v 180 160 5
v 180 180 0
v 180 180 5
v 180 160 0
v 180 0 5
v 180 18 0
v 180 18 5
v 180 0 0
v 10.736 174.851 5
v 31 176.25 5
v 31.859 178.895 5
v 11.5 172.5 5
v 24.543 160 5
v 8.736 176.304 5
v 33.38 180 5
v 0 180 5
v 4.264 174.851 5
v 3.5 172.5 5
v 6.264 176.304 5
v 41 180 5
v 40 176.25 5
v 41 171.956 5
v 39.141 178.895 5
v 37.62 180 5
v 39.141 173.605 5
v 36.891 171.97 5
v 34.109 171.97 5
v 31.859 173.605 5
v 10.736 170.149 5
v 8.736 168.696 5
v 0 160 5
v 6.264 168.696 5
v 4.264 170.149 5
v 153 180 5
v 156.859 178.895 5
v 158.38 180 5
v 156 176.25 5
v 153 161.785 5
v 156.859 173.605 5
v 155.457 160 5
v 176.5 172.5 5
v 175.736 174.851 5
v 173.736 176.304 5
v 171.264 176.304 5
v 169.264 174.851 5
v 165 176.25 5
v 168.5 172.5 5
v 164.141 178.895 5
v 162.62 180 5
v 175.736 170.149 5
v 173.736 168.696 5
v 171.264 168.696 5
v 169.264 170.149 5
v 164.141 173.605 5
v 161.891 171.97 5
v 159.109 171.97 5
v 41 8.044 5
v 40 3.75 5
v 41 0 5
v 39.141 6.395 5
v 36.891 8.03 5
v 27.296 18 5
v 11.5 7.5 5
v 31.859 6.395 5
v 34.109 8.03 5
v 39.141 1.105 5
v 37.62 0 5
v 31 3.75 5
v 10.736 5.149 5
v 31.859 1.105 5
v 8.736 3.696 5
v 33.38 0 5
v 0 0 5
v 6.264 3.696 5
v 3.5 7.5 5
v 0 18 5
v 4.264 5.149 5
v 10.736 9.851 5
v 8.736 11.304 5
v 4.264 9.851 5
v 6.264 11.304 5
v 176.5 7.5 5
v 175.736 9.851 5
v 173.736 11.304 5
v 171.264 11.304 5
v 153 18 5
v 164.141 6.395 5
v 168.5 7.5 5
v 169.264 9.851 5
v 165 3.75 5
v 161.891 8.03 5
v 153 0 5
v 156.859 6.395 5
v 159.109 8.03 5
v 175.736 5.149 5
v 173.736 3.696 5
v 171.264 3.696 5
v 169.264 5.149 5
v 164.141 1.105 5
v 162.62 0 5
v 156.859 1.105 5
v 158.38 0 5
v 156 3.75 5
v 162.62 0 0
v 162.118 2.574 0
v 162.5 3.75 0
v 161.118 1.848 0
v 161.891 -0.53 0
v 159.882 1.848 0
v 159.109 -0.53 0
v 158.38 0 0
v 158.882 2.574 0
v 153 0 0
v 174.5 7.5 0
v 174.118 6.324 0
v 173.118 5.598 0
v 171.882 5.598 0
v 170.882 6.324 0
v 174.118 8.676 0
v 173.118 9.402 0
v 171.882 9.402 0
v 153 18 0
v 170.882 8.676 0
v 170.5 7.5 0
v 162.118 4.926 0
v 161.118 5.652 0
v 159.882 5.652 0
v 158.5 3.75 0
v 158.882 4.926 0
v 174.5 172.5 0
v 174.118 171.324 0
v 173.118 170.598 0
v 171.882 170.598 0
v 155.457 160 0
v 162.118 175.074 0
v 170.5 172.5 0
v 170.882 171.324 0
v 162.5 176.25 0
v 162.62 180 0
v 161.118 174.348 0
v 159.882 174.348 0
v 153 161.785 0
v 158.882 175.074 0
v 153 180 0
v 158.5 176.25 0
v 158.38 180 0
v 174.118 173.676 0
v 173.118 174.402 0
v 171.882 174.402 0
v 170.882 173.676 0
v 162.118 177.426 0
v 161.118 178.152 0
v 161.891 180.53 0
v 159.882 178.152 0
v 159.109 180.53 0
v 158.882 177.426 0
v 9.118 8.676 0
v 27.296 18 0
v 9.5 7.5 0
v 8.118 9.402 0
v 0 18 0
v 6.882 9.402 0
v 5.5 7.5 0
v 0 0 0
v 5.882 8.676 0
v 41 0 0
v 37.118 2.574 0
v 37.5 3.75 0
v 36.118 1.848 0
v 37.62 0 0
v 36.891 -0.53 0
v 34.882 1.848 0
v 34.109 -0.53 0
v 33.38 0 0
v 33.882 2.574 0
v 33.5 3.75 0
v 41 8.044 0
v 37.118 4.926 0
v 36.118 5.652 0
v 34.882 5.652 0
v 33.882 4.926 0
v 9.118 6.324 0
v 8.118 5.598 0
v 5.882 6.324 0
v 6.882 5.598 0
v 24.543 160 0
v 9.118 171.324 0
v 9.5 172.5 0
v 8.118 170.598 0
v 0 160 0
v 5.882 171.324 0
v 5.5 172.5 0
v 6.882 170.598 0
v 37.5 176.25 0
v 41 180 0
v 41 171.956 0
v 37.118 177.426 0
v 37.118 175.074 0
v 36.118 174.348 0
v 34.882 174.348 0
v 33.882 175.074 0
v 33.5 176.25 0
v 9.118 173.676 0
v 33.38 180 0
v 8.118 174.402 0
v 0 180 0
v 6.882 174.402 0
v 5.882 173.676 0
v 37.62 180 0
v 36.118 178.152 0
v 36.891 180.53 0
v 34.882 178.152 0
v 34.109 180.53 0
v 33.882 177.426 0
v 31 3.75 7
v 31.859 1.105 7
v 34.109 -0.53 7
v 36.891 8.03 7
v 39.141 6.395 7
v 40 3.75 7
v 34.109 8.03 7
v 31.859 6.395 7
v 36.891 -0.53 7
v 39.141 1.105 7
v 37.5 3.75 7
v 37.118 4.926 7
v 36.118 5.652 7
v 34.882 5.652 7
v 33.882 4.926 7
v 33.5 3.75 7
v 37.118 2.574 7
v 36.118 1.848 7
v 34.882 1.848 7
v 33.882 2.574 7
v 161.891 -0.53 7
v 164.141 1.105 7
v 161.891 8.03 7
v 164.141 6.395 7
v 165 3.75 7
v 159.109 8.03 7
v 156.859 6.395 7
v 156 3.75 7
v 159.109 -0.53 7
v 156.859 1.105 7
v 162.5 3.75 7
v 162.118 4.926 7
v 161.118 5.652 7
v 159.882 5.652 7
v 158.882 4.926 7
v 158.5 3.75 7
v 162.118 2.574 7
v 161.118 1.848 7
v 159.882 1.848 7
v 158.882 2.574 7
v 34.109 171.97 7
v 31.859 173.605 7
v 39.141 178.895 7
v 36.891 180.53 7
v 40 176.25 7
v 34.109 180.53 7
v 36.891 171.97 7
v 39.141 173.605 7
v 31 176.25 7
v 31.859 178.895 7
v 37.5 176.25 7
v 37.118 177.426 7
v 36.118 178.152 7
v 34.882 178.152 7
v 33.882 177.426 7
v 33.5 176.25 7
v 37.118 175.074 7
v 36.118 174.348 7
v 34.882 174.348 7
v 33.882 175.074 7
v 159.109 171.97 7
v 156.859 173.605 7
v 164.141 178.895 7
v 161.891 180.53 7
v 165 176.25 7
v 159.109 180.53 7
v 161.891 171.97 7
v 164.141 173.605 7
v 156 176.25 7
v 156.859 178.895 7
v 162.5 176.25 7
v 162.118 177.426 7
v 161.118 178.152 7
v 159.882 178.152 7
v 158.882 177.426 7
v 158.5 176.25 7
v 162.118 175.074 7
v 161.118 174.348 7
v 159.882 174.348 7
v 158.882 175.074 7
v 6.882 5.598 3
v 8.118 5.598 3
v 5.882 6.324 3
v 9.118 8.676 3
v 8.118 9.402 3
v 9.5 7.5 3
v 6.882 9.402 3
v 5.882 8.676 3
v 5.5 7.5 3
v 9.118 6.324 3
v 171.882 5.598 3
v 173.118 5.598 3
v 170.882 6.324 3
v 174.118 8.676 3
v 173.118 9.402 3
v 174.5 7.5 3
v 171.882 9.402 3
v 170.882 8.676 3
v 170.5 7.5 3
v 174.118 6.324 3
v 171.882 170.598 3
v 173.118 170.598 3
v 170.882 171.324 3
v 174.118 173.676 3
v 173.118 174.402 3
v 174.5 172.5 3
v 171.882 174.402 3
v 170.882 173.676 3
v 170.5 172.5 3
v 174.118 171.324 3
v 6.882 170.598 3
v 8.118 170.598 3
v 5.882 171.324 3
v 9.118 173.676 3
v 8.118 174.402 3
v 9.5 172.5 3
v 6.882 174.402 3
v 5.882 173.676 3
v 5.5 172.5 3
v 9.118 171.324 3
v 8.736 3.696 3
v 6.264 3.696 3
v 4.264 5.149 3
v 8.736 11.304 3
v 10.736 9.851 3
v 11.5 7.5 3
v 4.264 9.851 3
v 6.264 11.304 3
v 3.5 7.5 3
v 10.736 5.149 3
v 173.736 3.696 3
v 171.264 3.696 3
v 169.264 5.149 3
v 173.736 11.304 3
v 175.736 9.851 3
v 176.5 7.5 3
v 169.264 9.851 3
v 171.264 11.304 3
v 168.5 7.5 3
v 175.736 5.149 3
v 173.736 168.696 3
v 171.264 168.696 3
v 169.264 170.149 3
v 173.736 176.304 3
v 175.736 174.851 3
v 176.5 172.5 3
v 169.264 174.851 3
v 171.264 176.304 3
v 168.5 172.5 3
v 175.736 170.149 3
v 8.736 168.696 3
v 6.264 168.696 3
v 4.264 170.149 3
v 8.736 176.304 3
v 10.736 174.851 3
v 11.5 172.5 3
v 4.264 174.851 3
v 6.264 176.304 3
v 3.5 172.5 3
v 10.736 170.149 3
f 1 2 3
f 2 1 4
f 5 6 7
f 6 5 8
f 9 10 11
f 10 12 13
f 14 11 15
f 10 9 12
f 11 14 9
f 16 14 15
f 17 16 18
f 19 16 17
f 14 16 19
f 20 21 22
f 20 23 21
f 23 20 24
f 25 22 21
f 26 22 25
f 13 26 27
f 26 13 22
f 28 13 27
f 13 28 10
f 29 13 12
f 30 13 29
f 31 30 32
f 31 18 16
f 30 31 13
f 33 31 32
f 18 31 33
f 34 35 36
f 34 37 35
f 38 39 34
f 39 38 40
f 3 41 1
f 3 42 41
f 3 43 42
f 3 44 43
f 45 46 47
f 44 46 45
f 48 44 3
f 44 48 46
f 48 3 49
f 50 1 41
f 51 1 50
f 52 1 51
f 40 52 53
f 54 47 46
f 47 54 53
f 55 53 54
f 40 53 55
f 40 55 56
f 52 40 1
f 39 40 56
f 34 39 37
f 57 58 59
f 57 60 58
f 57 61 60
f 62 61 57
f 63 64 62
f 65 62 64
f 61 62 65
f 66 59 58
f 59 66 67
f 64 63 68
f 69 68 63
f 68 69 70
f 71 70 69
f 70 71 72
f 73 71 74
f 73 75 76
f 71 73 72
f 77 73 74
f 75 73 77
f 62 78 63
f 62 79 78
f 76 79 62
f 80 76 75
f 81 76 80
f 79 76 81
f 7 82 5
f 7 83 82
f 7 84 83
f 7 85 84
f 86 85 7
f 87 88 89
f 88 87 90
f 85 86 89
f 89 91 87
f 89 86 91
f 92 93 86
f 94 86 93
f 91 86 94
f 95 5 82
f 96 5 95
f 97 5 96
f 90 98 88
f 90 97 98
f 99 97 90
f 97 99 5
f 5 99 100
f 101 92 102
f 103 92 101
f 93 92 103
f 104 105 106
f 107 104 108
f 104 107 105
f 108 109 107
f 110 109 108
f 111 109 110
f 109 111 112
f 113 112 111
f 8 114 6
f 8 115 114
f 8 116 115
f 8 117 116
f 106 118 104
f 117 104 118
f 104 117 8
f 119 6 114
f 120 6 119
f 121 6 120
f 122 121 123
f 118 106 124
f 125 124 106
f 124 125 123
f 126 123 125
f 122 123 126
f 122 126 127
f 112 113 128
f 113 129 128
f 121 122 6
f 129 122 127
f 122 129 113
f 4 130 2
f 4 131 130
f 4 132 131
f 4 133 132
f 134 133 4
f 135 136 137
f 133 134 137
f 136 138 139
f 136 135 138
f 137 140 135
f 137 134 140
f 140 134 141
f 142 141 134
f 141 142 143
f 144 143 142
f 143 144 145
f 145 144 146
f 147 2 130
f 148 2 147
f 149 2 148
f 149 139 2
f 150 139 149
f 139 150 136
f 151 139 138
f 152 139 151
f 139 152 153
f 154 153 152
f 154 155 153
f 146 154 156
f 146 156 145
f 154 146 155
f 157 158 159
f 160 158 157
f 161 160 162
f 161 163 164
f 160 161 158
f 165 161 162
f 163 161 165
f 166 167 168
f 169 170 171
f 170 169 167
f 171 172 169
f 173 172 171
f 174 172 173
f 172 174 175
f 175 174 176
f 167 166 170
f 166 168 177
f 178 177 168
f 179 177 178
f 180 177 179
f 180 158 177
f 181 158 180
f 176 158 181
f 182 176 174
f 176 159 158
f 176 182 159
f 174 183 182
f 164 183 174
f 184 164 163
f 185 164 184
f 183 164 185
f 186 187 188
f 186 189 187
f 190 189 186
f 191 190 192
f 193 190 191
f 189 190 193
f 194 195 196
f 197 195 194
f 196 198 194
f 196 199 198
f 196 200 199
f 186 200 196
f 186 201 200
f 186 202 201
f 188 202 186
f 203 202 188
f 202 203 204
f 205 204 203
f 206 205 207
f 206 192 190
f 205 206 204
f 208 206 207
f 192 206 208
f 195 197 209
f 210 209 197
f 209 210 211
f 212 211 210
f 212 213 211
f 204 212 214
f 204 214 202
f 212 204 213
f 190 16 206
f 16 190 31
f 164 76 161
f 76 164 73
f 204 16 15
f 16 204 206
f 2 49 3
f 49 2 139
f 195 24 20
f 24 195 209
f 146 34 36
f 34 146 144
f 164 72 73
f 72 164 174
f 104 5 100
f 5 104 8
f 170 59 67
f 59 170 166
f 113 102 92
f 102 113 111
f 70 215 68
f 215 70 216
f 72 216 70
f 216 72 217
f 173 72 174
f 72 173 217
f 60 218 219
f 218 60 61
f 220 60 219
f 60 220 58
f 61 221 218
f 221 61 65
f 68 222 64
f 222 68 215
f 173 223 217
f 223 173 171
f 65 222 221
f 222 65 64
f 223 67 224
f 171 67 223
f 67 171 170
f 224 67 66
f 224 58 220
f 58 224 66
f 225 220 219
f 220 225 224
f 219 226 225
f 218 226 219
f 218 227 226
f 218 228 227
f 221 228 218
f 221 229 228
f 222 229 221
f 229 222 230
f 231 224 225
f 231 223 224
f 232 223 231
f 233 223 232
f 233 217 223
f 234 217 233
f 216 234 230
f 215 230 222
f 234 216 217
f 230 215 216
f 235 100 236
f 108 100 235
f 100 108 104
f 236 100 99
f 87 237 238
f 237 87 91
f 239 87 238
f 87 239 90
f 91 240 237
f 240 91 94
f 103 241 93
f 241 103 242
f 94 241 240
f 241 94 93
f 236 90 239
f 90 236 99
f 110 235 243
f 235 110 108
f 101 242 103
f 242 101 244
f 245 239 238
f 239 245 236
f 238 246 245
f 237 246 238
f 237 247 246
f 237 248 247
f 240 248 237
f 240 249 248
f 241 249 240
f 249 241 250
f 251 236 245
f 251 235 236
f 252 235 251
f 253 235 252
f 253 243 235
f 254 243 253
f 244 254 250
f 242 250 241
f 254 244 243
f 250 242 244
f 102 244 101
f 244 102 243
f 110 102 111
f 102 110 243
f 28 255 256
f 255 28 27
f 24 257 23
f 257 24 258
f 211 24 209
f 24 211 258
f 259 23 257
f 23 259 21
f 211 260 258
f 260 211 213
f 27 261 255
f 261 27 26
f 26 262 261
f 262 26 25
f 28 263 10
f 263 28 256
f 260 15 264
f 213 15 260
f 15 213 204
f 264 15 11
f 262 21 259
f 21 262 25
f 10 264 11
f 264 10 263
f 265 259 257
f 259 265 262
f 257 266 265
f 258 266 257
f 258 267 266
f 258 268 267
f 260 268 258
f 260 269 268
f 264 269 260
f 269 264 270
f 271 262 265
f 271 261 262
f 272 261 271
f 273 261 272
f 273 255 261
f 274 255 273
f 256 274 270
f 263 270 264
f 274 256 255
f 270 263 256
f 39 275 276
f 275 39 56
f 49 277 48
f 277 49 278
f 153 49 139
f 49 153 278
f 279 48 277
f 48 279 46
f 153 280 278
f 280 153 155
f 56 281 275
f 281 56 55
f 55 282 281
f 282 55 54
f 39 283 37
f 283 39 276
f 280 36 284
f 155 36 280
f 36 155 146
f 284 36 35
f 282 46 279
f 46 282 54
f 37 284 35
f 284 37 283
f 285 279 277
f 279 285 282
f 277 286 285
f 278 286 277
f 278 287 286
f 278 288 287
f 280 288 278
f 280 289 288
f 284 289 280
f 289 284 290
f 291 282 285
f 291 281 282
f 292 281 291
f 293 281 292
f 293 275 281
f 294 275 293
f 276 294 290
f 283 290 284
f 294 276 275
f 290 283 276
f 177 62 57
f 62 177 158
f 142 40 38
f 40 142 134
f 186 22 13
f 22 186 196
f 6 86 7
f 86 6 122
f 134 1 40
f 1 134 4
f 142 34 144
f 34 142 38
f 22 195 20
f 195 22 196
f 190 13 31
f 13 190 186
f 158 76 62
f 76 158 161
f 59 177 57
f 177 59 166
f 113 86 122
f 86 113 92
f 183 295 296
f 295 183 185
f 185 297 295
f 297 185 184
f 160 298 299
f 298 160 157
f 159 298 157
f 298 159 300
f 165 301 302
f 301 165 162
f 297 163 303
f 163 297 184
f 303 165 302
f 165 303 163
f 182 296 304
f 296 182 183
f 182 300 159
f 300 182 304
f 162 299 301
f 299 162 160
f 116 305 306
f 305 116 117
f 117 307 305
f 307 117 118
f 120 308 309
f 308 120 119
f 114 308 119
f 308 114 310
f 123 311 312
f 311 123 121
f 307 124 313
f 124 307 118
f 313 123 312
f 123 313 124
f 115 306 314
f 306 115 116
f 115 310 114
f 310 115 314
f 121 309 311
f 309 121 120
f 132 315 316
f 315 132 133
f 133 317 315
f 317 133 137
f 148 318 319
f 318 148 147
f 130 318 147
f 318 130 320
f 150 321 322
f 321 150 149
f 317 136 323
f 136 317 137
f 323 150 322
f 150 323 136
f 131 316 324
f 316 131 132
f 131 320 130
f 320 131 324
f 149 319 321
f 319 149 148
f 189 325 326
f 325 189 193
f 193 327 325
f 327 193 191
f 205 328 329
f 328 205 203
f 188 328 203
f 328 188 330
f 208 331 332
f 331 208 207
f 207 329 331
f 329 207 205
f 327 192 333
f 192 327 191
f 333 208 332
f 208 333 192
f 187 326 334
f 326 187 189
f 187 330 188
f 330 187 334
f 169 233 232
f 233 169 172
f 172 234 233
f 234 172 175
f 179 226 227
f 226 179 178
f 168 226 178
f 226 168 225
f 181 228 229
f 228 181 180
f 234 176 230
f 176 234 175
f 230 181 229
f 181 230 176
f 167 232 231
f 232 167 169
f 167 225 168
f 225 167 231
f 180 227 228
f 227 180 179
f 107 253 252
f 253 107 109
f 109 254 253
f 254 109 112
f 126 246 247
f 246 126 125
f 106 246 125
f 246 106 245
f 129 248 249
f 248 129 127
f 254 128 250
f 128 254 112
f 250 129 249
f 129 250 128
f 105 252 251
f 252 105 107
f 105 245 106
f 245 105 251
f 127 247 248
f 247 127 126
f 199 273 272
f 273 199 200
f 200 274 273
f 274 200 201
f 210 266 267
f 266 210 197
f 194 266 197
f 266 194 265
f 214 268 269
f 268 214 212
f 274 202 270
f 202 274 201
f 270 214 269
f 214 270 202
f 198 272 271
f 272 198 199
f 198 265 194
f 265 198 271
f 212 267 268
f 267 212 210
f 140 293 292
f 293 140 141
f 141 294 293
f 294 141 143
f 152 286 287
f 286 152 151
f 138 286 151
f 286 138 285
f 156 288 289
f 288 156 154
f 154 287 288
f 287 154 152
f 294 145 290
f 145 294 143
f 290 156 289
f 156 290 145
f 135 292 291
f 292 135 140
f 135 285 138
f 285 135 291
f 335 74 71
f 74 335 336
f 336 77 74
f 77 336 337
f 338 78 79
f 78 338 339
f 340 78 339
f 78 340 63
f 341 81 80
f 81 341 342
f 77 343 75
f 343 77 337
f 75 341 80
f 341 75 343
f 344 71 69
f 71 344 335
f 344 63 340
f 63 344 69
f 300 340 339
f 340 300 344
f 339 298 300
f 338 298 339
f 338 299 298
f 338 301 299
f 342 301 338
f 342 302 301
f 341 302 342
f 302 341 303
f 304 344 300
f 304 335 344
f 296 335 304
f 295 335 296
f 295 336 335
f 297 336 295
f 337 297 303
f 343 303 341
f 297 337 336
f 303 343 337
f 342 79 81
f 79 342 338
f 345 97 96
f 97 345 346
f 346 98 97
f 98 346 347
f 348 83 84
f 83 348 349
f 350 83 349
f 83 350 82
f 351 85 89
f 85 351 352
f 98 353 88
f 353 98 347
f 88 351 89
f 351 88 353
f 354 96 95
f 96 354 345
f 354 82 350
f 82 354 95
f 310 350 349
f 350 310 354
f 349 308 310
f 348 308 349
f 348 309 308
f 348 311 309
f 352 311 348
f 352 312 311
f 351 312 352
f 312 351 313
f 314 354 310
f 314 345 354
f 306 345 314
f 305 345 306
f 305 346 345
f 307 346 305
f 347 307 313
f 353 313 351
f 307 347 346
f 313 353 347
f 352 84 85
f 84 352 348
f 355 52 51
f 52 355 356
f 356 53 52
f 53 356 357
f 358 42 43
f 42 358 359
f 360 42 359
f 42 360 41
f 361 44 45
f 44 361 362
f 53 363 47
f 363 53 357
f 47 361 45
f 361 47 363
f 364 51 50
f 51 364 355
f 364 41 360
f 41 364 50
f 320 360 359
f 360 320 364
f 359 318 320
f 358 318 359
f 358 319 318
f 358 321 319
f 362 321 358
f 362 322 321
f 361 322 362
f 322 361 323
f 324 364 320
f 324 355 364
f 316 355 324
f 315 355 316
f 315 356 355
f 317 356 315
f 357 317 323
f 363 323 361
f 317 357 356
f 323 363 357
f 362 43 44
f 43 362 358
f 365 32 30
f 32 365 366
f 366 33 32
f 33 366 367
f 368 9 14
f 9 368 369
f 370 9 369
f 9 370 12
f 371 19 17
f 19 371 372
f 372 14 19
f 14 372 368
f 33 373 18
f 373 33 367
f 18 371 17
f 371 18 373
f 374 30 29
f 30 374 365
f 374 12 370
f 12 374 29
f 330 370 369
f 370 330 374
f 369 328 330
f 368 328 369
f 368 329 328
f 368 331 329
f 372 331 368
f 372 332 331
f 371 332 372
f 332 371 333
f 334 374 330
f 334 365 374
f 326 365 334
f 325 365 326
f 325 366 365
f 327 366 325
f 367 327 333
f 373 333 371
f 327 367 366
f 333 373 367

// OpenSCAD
source_d = 180;
target_d = 140;

window_width = 145;
window_right_gap = 9.5;

core_h = 5;

screw_hole_d = 4;

source_through_h = core_h;

$fn = 10;

lip_h = 0;
lip_padding = 0;
lip_thickness = 5;

lip_d = source_d + lip_padding;

target_screwhole__to_mount_h = 2;
target_screwhole_lip_h = lip_h + target_screwhole__to_mount_h;
target_screwhole_lip_thickness = 5;

center_offset = (lip_d - window_width)/2 - window_right_gap;
adapter_x_offset = center_offset + (source_d - target_d) / 2;

difference() {
    union() {
        cube([source_d, source_d, core_h]);

        // Lip
        translate([source_d/2, source_d/2,0]) {
            cylinder(h = source_through_h + lip_h, d = lip_d);
        }

        // Target Screw lip hole 1
        translate([adapter_x_offset + 7.5, 7.5 / 2, 0]) {
            cylinder(h = source_through_h + target_screwhole_lip_h, d = screw_hole_d + target_screwhole_lip_thickness);
        }

        // Target Screw lip hole 2
        translate([adapter_x_offset + target_d - 7.5, 7.5 / 2, 0]) {
            cylinder(h = source_through_h + target_screwhole_lip_h, d = screw_hole_d + target_screwhole_lip_thickness);
        } 

        // Target Screw lip hole 3
        translate([adapter_x_offset + 7.5, source_d - 7.5/2, 0]) {
            cylinder(h = source_through_h + target_screwhole_lip_h, d = screw_hole_d + target_screwhole_lip_thickness);
        }

        // Target Screw lip hole 4
        translate([adapter_x_offset + target_d - 7.5, source_d - 7.5/2, 0]) {
            cylinder(h = source_through_h + target_screwhole_lip_h, d = screw_hole_d + target_screwhole_lip_thickness);
        }

    }
    
    // Fan hole
    translate([source_d/2, source_d/2, -1]) {
        cylinder(h = source_through_h + 2, r = source_d/2 + 10);
    }

    // Corner gaps
    linear_extrude(height = source_through_h + 2)  {
        // y-spanning
        translate([source_d/2-1, source_d/2-1, - 1]) {
            square([source_d+2, source_d - 40 +2], center=true);
        }

        // x gap
        translate([source_d/2-1 + center_offset, source_d/2-1, - 1]) {
            square([source_d - 70+2, source_d+2], center=true);
        }
    }

    // Source Screw hole 1
    translate([7.5, 7.5, 0]) {
        cylinder(h = source_through_h, d = screw_hole_d);
    }



    // Source Screw hole 2
    translate([source_d - 7.5, 7.5, 0]) {
        cylinder(h = source_through_h, d = screw_hole_d);
    }

    // Source Screw hole 3
    translate([source_d - 7.5, source_d - 7.5, 0]) {
        cylinder(h = source_through_h, d = screw_hole_d);
    }


    // Source Screw hole 4
    translate([7.5, source_d - 7.5, 0]) {
        cylinder(h = source_through_h, d = screw_hole_d);
    }

    // Target Screw hole 1
    translate([adapter_x_offset + 7.5, 7.5 / 2, 0]) {
        cylinder(h = source_through_h + target_screwhole_lip_h + 1, d = screw_hole_d);
    }

    // Target Screw hole 2
    translate([adapter_x_offset + target_d - 7.5, 7.5 / 2, 0]) {
        cylinder(h = source_through_h + target_screwhole_lip_h + 1, d = screw_hole_d);
    } 

    // Target Screw hole 3
    translate([adapter_x_offset + 7.5, source_d - 7.5/2, 0]) {
        cylinder(h = source_through_h + target_screwhole_lip_h + 1, d = screw_hole_d);
    }

    // Target Screw hole 4
    translate([adapter_x_offset + target_d - 7.5, source_d - 7.5/2, 0]) {
        cylinder(h = source_through_h + target_screwhole_lip_h + 1, d = screw_hole_d);
    }

    // Source Screwhole Countersinks
    counter_sink_h = 2;
    counter_sink_r = 4;
    translate([7.5, 7.5, source_through_h - counter_sink_h]) {
        cylinder(h = counter_sink_h, r = counter_sink_r);
    }
    translate([source_d - 7.5, 7.5, source_through_h - counter_sink_h]) {
        cylinder(h = counter_sink_h, r = counter_sink_r);
    }
    translate([source_d - 7.5, source_d - 7.5, source_through_h - counter_sink_h]) {
        cylinder(h = counter_sink_h, r = counter_sink_r);
    }
    translate([7.5, source_d - 7.5, source_through_h - counter_sink_h]) {
        cylinder(h = counter_sink_h, r = counter_sink_r);
    }
}
